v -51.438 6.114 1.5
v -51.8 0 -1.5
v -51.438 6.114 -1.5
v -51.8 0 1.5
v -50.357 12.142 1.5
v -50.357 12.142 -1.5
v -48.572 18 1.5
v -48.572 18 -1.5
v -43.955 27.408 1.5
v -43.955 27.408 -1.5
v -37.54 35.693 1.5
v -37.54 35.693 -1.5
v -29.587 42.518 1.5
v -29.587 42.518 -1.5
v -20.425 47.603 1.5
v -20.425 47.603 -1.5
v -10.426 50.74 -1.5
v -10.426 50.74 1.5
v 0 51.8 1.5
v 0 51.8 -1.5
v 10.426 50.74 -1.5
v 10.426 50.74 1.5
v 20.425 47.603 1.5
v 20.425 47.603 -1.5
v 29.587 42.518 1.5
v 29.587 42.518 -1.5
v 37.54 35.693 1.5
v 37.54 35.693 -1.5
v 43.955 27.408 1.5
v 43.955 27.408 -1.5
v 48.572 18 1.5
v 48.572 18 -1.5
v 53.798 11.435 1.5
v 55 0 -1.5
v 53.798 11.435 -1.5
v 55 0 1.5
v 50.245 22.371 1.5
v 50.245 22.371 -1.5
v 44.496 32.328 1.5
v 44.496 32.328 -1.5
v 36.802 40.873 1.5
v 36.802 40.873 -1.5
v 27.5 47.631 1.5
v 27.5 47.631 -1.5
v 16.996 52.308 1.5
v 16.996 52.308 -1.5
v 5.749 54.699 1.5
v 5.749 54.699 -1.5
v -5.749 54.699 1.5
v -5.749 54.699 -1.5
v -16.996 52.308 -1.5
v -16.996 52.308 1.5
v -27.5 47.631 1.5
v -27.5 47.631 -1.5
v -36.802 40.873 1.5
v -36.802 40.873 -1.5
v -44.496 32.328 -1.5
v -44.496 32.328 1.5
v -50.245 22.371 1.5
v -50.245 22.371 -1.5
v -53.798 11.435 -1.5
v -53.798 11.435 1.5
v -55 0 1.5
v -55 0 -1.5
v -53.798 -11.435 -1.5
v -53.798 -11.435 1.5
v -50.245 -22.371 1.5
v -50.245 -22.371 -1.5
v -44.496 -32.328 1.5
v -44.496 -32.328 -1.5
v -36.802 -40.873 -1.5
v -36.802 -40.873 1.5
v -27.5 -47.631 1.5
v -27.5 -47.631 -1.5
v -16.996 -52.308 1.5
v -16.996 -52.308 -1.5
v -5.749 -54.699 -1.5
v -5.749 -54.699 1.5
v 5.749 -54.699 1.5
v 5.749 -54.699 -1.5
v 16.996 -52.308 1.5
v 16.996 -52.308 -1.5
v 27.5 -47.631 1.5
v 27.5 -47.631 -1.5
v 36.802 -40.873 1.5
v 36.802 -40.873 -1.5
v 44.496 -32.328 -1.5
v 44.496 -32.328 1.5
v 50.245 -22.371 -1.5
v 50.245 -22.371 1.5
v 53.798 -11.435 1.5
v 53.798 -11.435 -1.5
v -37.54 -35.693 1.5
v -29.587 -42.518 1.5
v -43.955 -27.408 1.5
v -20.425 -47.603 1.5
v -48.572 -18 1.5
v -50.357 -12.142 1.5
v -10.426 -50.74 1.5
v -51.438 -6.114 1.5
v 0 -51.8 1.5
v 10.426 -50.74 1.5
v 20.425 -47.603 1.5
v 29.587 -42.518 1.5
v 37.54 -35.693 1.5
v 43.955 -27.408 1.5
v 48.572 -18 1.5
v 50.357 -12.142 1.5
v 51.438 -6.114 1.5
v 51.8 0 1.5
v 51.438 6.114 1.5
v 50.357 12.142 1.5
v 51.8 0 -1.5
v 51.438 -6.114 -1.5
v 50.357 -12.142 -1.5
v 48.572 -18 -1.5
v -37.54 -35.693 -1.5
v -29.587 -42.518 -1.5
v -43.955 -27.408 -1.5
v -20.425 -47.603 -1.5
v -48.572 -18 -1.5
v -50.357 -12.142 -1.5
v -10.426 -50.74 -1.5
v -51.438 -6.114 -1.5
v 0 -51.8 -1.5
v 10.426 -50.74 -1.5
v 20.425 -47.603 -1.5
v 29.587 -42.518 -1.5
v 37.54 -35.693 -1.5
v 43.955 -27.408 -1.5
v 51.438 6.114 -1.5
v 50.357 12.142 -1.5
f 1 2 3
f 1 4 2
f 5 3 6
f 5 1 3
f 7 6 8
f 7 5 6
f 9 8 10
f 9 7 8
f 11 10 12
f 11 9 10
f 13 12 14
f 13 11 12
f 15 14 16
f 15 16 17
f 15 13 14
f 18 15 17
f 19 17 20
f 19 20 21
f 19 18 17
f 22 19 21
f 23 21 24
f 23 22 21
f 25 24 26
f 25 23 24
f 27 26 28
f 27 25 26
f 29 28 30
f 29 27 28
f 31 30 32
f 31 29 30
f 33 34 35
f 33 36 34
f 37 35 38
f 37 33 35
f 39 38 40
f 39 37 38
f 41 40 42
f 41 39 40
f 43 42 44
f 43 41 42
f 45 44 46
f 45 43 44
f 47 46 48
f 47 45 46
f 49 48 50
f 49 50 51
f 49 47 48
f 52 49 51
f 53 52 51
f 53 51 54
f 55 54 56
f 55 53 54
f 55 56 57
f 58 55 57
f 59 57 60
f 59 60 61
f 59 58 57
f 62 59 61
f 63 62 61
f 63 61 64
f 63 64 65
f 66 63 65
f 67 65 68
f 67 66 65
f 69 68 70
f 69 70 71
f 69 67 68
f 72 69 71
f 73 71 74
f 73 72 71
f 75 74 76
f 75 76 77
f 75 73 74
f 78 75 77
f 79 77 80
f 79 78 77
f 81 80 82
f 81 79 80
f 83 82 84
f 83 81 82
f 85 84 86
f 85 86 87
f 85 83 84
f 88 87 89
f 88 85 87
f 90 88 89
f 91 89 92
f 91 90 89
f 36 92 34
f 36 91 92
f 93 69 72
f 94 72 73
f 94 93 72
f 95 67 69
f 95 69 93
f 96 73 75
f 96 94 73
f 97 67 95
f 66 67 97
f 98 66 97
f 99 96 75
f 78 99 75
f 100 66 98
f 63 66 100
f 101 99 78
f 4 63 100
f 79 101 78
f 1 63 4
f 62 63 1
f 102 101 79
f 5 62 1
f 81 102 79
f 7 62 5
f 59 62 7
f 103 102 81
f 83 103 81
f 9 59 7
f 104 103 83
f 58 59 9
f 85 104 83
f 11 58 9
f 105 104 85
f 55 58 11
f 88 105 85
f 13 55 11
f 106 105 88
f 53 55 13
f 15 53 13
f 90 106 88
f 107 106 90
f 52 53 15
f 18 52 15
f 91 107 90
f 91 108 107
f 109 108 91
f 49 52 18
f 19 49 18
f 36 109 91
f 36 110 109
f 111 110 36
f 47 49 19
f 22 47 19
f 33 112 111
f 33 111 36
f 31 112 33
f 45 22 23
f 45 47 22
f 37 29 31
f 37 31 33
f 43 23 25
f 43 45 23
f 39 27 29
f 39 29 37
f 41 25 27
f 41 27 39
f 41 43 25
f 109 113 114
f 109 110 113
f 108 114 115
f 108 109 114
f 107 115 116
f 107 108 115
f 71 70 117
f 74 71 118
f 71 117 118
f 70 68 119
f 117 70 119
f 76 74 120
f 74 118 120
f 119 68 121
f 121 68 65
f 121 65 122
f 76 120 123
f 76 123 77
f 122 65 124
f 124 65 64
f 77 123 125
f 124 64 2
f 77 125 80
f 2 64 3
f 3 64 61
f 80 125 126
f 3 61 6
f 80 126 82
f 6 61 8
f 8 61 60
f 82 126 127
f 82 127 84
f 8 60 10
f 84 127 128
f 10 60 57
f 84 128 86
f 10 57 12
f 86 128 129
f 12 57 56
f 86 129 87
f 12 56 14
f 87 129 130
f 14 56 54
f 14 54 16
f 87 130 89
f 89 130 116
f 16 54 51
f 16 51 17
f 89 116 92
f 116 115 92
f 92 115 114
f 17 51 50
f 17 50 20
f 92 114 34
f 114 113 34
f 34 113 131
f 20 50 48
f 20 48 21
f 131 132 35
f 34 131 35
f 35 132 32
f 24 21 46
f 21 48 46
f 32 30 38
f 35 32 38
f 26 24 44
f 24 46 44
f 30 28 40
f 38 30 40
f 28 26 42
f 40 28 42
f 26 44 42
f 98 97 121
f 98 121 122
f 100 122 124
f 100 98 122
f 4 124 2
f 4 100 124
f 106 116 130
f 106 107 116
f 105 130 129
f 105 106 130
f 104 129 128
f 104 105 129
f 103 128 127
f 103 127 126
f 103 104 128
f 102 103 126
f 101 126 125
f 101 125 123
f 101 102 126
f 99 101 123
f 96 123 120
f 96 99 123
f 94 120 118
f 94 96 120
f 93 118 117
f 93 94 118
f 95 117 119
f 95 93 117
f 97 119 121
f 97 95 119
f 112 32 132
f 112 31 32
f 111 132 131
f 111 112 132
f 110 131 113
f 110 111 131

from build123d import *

# Parameters (mm, degrees)
F0_R     = 55
F1_DEPTH = 1.5


with BuildPart() as f1:
    # F0 (on Top) → F1 (new body, symmetric)
    with BuildSketch(Plane.XY):
        Circle(F0_R)
        with BuildLine():
            ThreePointArc((-48.572008, -18), (-50.986616, -9.143576), (-51.8, 0))
            ThreePointArc((-51.8, 0), (-50.986616, 9.143576), (-48.572008, 18))
            ThreePointArc((-48.572008, 18), (0, 51.8), (48.572008, 18))
            ThreePointArc((48.572008, 18), (50.986616, 9.143576), (51.8, 0))
            ThreePointArc((51.8, 0), (50.986616, -9.143576), (48.572008, -18))
            ThreePointArc((48.572008, -18), (0, -51.8), (-48.572008, -18))
        make_face(mode=Mode.SUBTRACT)
    extrude(amount=F1_DEPTH, both=True)


solid = f1.part
